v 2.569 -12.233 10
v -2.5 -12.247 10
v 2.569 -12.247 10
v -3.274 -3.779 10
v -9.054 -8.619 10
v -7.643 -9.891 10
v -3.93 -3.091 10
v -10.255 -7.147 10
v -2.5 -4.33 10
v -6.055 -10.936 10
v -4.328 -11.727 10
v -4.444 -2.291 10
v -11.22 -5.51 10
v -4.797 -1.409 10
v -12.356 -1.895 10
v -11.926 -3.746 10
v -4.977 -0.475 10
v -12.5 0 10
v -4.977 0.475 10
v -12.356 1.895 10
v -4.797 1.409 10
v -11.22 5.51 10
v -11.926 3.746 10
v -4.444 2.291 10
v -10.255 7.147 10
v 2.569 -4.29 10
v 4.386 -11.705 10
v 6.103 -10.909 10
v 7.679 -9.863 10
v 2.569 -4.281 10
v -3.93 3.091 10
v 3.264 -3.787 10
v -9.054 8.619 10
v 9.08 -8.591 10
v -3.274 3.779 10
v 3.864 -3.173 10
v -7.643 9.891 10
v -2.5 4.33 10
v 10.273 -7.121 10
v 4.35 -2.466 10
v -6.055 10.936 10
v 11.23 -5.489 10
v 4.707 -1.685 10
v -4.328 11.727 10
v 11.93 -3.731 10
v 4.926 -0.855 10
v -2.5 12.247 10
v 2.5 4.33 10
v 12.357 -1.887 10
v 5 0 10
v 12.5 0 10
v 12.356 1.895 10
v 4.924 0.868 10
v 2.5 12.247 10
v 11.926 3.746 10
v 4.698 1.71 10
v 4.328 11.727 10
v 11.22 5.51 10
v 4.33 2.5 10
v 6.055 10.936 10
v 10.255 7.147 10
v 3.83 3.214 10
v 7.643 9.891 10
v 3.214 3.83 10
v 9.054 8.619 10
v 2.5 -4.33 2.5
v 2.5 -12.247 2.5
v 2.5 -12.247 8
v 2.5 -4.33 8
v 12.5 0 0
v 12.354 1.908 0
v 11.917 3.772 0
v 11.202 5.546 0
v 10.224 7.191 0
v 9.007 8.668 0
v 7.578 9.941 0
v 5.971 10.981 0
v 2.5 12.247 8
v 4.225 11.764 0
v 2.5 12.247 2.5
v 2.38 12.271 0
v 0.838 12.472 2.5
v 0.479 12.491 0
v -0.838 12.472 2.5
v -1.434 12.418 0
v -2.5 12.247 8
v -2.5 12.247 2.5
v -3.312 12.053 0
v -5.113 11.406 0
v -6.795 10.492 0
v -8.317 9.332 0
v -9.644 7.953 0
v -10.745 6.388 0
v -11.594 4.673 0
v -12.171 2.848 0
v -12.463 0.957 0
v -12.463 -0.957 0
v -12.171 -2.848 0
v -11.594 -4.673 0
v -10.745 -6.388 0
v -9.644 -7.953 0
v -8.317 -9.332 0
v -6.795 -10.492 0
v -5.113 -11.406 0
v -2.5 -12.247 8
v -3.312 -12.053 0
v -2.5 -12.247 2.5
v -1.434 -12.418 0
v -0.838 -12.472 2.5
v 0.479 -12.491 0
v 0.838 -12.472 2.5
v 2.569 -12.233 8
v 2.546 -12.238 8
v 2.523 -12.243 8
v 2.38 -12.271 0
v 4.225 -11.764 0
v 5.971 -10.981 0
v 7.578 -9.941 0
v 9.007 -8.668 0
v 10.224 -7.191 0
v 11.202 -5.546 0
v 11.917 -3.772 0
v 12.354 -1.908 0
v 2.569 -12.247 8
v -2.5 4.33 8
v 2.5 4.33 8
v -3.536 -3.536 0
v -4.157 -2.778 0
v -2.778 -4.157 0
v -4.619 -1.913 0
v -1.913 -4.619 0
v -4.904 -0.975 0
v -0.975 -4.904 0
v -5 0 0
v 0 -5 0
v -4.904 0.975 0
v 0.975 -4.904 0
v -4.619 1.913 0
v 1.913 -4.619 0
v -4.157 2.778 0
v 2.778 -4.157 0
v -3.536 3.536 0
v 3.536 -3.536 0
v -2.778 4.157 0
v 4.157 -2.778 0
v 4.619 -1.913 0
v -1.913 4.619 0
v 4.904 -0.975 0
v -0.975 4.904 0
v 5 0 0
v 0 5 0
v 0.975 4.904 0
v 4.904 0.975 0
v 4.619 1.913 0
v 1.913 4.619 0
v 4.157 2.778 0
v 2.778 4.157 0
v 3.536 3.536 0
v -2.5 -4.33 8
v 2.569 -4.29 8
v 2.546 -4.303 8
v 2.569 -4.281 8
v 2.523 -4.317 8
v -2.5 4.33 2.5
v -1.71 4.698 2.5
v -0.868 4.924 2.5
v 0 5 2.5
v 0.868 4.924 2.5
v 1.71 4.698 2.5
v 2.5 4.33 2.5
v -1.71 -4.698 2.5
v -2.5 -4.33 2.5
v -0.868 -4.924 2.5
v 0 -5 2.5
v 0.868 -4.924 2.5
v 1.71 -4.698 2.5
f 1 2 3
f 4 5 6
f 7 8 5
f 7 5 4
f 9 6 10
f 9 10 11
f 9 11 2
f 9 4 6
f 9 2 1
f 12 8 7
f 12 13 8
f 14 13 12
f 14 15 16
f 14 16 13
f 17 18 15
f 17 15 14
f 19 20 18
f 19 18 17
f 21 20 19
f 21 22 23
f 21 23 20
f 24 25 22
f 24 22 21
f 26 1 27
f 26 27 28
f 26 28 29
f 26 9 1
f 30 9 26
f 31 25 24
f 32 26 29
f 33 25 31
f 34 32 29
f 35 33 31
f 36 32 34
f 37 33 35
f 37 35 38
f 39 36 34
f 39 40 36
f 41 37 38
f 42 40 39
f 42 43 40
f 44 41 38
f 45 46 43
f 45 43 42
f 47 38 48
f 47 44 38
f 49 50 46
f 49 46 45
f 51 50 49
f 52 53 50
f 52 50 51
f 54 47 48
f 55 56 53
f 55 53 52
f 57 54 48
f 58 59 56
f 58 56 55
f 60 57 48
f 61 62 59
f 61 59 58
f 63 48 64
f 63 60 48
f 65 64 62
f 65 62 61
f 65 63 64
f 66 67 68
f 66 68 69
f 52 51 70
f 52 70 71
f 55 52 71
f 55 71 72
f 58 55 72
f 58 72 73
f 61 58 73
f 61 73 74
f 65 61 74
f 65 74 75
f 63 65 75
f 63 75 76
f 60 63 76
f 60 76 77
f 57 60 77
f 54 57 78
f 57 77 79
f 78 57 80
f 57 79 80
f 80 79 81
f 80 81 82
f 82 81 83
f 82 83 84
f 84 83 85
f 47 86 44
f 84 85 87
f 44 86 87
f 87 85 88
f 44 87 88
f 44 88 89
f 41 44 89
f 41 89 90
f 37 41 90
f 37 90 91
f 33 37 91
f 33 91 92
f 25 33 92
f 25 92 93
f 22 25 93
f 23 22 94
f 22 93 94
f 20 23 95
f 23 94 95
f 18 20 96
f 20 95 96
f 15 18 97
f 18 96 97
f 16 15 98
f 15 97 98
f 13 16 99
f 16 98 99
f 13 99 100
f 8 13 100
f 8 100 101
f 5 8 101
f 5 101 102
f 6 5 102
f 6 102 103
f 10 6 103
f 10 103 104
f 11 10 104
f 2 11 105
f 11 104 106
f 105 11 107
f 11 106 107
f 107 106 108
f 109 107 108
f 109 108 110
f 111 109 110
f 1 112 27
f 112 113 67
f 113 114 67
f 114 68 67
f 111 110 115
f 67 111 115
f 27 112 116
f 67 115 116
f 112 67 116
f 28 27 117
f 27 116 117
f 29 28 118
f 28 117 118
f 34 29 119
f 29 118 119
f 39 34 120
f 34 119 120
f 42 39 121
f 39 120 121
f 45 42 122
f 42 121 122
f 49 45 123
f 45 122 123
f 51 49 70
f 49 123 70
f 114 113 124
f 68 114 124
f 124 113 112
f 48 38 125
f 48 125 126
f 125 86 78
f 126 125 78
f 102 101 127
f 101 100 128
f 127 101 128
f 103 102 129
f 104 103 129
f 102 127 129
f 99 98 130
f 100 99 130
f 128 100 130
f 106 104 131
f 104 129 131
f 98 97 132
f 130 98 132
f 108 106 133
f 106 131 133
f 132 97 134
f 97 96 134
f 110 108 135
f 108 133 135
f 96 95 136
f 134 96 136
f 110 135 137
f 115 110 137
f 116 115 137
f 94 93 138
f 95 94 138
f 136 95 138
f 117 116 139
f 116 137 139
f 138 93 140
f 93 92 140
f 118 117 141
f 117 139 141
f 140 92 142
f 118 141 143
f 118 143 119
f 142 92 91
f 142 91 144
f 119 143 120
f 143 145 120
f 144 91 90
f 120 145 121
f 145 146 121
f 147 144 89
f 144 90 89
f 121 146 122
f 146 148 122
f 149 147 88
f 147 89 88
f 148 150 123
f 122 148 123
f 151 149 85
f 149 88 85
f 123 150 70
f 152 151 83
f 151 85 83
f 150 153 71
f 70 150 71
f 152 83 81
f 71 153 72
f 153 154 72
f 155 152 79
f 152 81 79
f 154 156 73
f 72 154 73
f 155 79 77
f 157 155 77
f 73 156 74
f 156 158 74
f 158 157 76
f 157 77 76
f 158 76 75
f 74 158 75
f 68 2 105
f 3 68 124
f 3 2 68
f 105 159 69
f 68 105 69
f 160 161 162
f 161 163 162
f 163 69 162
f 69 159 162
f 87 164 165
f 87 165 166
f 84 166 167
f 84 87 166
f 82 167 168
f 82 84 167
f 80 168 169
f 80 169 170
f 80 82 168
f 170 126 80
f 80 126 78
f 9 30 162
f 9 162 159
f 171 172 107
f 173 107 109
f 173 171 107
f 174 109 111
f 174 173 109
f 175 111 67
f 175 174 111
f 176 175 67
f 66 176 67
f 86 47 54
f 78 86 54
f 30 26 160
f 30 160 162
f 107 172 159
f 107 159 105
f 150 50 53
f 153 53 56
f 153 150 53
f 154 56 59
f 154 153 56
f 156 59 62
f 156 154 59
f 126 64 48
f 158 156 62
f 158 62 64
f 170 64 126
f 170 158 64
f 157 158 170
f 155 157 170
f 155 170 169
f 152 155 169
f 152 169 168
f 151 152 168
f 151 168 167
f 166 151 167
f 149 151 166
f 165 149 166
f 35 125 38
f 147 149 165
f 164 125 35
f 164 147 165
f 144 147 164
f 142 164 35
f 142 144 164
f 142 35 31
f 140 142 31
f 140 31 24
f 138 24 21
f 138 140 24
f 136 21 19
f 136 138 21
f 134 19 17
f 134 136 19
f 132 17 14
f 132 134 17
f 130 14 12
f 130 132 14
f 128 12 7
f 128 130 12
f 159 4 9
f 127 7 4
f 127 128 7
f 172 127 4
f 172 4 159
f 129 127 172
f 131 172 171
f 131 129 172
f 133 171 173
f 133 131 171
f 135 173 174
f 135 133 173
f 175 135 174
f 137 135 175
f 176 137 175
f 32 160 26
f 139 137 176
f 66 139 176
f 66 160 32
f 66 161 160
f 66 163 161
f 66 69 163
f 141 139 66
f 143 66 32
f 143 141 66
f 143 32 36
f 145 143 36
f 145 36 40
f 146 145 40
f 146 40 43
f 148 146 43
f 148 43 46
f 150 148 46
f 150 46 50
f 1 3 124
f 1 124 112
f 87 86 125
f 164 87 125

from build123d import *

# Parameters (mm, degrees)
F0_R     = 12.5
F0_R_2   = 5
F1_DEPTH = 10
F3_DEPTH = 7.5
F5_DEPTH = 2
F6_W     = 5
F6_H     = 7.917322
F7_DEPTH = 2


with BuildPart() as f1:
    # F0 (on Top) → F1 (new body)
    with BuildSketch(Plane.XY):
        Circle(F0_R)
        Circle(F0_R_2, mode=Mode.SUBTRACT)
    extrude(amount=F1_DEPTH)

    # F2 (on face) → F3 (cut, symmetric)
    with BuildSketch(Plane.XY.offset(10)):
        with BuildLine():
            Line((-2.5, -4.330127), (-2.5, -12.247449))
            ThreePointArc((-2.5, -12.247449), (0, -12.5), (2.5, -12.247449))
            Line((2.5, -12.247449), (2.5, -4.330127))
            ThreePointArc((2.5, -4.330127), (0, -5), (-2.5, -4.330127))
        make_face()
        with BuildLine():
            ThreePointArc((2.5, 12.247449), (0, 12.5), (-2.5, 12.247449))
            Line((-2.5, 12.247449), (-2.5, 4.330127))
            ThreePointArc((-2.5, 4.330127), (0, 5), (2.5, 4.330127))
            Line((2.5, 4.330127), (2.5, 12.247449))
        make_face()
    extrude(amount=F3_DEPTH, both=True, mode=Mode.SUBTRACT)

    # F4 (on face) → F5 (join)
    with BuildSketch(Plane.XY.offset(10)):
        Polygon((-2.5, -4.330127), (-2.5, -12.247449), (2.568516, -12.247449), (2.568516, -4.281065), align=None)
    extrude(amount=-F5_DEPTH)

    # F6 (on face) → F7 (join)
    with BuildSketch(Plane.XY.offset(10)):
        with Locations((0, 8.288788)):
            Rectangle(F6_W, F6_H)
    extrude(amount=-F7_DEPTH)


solid = f1.part
